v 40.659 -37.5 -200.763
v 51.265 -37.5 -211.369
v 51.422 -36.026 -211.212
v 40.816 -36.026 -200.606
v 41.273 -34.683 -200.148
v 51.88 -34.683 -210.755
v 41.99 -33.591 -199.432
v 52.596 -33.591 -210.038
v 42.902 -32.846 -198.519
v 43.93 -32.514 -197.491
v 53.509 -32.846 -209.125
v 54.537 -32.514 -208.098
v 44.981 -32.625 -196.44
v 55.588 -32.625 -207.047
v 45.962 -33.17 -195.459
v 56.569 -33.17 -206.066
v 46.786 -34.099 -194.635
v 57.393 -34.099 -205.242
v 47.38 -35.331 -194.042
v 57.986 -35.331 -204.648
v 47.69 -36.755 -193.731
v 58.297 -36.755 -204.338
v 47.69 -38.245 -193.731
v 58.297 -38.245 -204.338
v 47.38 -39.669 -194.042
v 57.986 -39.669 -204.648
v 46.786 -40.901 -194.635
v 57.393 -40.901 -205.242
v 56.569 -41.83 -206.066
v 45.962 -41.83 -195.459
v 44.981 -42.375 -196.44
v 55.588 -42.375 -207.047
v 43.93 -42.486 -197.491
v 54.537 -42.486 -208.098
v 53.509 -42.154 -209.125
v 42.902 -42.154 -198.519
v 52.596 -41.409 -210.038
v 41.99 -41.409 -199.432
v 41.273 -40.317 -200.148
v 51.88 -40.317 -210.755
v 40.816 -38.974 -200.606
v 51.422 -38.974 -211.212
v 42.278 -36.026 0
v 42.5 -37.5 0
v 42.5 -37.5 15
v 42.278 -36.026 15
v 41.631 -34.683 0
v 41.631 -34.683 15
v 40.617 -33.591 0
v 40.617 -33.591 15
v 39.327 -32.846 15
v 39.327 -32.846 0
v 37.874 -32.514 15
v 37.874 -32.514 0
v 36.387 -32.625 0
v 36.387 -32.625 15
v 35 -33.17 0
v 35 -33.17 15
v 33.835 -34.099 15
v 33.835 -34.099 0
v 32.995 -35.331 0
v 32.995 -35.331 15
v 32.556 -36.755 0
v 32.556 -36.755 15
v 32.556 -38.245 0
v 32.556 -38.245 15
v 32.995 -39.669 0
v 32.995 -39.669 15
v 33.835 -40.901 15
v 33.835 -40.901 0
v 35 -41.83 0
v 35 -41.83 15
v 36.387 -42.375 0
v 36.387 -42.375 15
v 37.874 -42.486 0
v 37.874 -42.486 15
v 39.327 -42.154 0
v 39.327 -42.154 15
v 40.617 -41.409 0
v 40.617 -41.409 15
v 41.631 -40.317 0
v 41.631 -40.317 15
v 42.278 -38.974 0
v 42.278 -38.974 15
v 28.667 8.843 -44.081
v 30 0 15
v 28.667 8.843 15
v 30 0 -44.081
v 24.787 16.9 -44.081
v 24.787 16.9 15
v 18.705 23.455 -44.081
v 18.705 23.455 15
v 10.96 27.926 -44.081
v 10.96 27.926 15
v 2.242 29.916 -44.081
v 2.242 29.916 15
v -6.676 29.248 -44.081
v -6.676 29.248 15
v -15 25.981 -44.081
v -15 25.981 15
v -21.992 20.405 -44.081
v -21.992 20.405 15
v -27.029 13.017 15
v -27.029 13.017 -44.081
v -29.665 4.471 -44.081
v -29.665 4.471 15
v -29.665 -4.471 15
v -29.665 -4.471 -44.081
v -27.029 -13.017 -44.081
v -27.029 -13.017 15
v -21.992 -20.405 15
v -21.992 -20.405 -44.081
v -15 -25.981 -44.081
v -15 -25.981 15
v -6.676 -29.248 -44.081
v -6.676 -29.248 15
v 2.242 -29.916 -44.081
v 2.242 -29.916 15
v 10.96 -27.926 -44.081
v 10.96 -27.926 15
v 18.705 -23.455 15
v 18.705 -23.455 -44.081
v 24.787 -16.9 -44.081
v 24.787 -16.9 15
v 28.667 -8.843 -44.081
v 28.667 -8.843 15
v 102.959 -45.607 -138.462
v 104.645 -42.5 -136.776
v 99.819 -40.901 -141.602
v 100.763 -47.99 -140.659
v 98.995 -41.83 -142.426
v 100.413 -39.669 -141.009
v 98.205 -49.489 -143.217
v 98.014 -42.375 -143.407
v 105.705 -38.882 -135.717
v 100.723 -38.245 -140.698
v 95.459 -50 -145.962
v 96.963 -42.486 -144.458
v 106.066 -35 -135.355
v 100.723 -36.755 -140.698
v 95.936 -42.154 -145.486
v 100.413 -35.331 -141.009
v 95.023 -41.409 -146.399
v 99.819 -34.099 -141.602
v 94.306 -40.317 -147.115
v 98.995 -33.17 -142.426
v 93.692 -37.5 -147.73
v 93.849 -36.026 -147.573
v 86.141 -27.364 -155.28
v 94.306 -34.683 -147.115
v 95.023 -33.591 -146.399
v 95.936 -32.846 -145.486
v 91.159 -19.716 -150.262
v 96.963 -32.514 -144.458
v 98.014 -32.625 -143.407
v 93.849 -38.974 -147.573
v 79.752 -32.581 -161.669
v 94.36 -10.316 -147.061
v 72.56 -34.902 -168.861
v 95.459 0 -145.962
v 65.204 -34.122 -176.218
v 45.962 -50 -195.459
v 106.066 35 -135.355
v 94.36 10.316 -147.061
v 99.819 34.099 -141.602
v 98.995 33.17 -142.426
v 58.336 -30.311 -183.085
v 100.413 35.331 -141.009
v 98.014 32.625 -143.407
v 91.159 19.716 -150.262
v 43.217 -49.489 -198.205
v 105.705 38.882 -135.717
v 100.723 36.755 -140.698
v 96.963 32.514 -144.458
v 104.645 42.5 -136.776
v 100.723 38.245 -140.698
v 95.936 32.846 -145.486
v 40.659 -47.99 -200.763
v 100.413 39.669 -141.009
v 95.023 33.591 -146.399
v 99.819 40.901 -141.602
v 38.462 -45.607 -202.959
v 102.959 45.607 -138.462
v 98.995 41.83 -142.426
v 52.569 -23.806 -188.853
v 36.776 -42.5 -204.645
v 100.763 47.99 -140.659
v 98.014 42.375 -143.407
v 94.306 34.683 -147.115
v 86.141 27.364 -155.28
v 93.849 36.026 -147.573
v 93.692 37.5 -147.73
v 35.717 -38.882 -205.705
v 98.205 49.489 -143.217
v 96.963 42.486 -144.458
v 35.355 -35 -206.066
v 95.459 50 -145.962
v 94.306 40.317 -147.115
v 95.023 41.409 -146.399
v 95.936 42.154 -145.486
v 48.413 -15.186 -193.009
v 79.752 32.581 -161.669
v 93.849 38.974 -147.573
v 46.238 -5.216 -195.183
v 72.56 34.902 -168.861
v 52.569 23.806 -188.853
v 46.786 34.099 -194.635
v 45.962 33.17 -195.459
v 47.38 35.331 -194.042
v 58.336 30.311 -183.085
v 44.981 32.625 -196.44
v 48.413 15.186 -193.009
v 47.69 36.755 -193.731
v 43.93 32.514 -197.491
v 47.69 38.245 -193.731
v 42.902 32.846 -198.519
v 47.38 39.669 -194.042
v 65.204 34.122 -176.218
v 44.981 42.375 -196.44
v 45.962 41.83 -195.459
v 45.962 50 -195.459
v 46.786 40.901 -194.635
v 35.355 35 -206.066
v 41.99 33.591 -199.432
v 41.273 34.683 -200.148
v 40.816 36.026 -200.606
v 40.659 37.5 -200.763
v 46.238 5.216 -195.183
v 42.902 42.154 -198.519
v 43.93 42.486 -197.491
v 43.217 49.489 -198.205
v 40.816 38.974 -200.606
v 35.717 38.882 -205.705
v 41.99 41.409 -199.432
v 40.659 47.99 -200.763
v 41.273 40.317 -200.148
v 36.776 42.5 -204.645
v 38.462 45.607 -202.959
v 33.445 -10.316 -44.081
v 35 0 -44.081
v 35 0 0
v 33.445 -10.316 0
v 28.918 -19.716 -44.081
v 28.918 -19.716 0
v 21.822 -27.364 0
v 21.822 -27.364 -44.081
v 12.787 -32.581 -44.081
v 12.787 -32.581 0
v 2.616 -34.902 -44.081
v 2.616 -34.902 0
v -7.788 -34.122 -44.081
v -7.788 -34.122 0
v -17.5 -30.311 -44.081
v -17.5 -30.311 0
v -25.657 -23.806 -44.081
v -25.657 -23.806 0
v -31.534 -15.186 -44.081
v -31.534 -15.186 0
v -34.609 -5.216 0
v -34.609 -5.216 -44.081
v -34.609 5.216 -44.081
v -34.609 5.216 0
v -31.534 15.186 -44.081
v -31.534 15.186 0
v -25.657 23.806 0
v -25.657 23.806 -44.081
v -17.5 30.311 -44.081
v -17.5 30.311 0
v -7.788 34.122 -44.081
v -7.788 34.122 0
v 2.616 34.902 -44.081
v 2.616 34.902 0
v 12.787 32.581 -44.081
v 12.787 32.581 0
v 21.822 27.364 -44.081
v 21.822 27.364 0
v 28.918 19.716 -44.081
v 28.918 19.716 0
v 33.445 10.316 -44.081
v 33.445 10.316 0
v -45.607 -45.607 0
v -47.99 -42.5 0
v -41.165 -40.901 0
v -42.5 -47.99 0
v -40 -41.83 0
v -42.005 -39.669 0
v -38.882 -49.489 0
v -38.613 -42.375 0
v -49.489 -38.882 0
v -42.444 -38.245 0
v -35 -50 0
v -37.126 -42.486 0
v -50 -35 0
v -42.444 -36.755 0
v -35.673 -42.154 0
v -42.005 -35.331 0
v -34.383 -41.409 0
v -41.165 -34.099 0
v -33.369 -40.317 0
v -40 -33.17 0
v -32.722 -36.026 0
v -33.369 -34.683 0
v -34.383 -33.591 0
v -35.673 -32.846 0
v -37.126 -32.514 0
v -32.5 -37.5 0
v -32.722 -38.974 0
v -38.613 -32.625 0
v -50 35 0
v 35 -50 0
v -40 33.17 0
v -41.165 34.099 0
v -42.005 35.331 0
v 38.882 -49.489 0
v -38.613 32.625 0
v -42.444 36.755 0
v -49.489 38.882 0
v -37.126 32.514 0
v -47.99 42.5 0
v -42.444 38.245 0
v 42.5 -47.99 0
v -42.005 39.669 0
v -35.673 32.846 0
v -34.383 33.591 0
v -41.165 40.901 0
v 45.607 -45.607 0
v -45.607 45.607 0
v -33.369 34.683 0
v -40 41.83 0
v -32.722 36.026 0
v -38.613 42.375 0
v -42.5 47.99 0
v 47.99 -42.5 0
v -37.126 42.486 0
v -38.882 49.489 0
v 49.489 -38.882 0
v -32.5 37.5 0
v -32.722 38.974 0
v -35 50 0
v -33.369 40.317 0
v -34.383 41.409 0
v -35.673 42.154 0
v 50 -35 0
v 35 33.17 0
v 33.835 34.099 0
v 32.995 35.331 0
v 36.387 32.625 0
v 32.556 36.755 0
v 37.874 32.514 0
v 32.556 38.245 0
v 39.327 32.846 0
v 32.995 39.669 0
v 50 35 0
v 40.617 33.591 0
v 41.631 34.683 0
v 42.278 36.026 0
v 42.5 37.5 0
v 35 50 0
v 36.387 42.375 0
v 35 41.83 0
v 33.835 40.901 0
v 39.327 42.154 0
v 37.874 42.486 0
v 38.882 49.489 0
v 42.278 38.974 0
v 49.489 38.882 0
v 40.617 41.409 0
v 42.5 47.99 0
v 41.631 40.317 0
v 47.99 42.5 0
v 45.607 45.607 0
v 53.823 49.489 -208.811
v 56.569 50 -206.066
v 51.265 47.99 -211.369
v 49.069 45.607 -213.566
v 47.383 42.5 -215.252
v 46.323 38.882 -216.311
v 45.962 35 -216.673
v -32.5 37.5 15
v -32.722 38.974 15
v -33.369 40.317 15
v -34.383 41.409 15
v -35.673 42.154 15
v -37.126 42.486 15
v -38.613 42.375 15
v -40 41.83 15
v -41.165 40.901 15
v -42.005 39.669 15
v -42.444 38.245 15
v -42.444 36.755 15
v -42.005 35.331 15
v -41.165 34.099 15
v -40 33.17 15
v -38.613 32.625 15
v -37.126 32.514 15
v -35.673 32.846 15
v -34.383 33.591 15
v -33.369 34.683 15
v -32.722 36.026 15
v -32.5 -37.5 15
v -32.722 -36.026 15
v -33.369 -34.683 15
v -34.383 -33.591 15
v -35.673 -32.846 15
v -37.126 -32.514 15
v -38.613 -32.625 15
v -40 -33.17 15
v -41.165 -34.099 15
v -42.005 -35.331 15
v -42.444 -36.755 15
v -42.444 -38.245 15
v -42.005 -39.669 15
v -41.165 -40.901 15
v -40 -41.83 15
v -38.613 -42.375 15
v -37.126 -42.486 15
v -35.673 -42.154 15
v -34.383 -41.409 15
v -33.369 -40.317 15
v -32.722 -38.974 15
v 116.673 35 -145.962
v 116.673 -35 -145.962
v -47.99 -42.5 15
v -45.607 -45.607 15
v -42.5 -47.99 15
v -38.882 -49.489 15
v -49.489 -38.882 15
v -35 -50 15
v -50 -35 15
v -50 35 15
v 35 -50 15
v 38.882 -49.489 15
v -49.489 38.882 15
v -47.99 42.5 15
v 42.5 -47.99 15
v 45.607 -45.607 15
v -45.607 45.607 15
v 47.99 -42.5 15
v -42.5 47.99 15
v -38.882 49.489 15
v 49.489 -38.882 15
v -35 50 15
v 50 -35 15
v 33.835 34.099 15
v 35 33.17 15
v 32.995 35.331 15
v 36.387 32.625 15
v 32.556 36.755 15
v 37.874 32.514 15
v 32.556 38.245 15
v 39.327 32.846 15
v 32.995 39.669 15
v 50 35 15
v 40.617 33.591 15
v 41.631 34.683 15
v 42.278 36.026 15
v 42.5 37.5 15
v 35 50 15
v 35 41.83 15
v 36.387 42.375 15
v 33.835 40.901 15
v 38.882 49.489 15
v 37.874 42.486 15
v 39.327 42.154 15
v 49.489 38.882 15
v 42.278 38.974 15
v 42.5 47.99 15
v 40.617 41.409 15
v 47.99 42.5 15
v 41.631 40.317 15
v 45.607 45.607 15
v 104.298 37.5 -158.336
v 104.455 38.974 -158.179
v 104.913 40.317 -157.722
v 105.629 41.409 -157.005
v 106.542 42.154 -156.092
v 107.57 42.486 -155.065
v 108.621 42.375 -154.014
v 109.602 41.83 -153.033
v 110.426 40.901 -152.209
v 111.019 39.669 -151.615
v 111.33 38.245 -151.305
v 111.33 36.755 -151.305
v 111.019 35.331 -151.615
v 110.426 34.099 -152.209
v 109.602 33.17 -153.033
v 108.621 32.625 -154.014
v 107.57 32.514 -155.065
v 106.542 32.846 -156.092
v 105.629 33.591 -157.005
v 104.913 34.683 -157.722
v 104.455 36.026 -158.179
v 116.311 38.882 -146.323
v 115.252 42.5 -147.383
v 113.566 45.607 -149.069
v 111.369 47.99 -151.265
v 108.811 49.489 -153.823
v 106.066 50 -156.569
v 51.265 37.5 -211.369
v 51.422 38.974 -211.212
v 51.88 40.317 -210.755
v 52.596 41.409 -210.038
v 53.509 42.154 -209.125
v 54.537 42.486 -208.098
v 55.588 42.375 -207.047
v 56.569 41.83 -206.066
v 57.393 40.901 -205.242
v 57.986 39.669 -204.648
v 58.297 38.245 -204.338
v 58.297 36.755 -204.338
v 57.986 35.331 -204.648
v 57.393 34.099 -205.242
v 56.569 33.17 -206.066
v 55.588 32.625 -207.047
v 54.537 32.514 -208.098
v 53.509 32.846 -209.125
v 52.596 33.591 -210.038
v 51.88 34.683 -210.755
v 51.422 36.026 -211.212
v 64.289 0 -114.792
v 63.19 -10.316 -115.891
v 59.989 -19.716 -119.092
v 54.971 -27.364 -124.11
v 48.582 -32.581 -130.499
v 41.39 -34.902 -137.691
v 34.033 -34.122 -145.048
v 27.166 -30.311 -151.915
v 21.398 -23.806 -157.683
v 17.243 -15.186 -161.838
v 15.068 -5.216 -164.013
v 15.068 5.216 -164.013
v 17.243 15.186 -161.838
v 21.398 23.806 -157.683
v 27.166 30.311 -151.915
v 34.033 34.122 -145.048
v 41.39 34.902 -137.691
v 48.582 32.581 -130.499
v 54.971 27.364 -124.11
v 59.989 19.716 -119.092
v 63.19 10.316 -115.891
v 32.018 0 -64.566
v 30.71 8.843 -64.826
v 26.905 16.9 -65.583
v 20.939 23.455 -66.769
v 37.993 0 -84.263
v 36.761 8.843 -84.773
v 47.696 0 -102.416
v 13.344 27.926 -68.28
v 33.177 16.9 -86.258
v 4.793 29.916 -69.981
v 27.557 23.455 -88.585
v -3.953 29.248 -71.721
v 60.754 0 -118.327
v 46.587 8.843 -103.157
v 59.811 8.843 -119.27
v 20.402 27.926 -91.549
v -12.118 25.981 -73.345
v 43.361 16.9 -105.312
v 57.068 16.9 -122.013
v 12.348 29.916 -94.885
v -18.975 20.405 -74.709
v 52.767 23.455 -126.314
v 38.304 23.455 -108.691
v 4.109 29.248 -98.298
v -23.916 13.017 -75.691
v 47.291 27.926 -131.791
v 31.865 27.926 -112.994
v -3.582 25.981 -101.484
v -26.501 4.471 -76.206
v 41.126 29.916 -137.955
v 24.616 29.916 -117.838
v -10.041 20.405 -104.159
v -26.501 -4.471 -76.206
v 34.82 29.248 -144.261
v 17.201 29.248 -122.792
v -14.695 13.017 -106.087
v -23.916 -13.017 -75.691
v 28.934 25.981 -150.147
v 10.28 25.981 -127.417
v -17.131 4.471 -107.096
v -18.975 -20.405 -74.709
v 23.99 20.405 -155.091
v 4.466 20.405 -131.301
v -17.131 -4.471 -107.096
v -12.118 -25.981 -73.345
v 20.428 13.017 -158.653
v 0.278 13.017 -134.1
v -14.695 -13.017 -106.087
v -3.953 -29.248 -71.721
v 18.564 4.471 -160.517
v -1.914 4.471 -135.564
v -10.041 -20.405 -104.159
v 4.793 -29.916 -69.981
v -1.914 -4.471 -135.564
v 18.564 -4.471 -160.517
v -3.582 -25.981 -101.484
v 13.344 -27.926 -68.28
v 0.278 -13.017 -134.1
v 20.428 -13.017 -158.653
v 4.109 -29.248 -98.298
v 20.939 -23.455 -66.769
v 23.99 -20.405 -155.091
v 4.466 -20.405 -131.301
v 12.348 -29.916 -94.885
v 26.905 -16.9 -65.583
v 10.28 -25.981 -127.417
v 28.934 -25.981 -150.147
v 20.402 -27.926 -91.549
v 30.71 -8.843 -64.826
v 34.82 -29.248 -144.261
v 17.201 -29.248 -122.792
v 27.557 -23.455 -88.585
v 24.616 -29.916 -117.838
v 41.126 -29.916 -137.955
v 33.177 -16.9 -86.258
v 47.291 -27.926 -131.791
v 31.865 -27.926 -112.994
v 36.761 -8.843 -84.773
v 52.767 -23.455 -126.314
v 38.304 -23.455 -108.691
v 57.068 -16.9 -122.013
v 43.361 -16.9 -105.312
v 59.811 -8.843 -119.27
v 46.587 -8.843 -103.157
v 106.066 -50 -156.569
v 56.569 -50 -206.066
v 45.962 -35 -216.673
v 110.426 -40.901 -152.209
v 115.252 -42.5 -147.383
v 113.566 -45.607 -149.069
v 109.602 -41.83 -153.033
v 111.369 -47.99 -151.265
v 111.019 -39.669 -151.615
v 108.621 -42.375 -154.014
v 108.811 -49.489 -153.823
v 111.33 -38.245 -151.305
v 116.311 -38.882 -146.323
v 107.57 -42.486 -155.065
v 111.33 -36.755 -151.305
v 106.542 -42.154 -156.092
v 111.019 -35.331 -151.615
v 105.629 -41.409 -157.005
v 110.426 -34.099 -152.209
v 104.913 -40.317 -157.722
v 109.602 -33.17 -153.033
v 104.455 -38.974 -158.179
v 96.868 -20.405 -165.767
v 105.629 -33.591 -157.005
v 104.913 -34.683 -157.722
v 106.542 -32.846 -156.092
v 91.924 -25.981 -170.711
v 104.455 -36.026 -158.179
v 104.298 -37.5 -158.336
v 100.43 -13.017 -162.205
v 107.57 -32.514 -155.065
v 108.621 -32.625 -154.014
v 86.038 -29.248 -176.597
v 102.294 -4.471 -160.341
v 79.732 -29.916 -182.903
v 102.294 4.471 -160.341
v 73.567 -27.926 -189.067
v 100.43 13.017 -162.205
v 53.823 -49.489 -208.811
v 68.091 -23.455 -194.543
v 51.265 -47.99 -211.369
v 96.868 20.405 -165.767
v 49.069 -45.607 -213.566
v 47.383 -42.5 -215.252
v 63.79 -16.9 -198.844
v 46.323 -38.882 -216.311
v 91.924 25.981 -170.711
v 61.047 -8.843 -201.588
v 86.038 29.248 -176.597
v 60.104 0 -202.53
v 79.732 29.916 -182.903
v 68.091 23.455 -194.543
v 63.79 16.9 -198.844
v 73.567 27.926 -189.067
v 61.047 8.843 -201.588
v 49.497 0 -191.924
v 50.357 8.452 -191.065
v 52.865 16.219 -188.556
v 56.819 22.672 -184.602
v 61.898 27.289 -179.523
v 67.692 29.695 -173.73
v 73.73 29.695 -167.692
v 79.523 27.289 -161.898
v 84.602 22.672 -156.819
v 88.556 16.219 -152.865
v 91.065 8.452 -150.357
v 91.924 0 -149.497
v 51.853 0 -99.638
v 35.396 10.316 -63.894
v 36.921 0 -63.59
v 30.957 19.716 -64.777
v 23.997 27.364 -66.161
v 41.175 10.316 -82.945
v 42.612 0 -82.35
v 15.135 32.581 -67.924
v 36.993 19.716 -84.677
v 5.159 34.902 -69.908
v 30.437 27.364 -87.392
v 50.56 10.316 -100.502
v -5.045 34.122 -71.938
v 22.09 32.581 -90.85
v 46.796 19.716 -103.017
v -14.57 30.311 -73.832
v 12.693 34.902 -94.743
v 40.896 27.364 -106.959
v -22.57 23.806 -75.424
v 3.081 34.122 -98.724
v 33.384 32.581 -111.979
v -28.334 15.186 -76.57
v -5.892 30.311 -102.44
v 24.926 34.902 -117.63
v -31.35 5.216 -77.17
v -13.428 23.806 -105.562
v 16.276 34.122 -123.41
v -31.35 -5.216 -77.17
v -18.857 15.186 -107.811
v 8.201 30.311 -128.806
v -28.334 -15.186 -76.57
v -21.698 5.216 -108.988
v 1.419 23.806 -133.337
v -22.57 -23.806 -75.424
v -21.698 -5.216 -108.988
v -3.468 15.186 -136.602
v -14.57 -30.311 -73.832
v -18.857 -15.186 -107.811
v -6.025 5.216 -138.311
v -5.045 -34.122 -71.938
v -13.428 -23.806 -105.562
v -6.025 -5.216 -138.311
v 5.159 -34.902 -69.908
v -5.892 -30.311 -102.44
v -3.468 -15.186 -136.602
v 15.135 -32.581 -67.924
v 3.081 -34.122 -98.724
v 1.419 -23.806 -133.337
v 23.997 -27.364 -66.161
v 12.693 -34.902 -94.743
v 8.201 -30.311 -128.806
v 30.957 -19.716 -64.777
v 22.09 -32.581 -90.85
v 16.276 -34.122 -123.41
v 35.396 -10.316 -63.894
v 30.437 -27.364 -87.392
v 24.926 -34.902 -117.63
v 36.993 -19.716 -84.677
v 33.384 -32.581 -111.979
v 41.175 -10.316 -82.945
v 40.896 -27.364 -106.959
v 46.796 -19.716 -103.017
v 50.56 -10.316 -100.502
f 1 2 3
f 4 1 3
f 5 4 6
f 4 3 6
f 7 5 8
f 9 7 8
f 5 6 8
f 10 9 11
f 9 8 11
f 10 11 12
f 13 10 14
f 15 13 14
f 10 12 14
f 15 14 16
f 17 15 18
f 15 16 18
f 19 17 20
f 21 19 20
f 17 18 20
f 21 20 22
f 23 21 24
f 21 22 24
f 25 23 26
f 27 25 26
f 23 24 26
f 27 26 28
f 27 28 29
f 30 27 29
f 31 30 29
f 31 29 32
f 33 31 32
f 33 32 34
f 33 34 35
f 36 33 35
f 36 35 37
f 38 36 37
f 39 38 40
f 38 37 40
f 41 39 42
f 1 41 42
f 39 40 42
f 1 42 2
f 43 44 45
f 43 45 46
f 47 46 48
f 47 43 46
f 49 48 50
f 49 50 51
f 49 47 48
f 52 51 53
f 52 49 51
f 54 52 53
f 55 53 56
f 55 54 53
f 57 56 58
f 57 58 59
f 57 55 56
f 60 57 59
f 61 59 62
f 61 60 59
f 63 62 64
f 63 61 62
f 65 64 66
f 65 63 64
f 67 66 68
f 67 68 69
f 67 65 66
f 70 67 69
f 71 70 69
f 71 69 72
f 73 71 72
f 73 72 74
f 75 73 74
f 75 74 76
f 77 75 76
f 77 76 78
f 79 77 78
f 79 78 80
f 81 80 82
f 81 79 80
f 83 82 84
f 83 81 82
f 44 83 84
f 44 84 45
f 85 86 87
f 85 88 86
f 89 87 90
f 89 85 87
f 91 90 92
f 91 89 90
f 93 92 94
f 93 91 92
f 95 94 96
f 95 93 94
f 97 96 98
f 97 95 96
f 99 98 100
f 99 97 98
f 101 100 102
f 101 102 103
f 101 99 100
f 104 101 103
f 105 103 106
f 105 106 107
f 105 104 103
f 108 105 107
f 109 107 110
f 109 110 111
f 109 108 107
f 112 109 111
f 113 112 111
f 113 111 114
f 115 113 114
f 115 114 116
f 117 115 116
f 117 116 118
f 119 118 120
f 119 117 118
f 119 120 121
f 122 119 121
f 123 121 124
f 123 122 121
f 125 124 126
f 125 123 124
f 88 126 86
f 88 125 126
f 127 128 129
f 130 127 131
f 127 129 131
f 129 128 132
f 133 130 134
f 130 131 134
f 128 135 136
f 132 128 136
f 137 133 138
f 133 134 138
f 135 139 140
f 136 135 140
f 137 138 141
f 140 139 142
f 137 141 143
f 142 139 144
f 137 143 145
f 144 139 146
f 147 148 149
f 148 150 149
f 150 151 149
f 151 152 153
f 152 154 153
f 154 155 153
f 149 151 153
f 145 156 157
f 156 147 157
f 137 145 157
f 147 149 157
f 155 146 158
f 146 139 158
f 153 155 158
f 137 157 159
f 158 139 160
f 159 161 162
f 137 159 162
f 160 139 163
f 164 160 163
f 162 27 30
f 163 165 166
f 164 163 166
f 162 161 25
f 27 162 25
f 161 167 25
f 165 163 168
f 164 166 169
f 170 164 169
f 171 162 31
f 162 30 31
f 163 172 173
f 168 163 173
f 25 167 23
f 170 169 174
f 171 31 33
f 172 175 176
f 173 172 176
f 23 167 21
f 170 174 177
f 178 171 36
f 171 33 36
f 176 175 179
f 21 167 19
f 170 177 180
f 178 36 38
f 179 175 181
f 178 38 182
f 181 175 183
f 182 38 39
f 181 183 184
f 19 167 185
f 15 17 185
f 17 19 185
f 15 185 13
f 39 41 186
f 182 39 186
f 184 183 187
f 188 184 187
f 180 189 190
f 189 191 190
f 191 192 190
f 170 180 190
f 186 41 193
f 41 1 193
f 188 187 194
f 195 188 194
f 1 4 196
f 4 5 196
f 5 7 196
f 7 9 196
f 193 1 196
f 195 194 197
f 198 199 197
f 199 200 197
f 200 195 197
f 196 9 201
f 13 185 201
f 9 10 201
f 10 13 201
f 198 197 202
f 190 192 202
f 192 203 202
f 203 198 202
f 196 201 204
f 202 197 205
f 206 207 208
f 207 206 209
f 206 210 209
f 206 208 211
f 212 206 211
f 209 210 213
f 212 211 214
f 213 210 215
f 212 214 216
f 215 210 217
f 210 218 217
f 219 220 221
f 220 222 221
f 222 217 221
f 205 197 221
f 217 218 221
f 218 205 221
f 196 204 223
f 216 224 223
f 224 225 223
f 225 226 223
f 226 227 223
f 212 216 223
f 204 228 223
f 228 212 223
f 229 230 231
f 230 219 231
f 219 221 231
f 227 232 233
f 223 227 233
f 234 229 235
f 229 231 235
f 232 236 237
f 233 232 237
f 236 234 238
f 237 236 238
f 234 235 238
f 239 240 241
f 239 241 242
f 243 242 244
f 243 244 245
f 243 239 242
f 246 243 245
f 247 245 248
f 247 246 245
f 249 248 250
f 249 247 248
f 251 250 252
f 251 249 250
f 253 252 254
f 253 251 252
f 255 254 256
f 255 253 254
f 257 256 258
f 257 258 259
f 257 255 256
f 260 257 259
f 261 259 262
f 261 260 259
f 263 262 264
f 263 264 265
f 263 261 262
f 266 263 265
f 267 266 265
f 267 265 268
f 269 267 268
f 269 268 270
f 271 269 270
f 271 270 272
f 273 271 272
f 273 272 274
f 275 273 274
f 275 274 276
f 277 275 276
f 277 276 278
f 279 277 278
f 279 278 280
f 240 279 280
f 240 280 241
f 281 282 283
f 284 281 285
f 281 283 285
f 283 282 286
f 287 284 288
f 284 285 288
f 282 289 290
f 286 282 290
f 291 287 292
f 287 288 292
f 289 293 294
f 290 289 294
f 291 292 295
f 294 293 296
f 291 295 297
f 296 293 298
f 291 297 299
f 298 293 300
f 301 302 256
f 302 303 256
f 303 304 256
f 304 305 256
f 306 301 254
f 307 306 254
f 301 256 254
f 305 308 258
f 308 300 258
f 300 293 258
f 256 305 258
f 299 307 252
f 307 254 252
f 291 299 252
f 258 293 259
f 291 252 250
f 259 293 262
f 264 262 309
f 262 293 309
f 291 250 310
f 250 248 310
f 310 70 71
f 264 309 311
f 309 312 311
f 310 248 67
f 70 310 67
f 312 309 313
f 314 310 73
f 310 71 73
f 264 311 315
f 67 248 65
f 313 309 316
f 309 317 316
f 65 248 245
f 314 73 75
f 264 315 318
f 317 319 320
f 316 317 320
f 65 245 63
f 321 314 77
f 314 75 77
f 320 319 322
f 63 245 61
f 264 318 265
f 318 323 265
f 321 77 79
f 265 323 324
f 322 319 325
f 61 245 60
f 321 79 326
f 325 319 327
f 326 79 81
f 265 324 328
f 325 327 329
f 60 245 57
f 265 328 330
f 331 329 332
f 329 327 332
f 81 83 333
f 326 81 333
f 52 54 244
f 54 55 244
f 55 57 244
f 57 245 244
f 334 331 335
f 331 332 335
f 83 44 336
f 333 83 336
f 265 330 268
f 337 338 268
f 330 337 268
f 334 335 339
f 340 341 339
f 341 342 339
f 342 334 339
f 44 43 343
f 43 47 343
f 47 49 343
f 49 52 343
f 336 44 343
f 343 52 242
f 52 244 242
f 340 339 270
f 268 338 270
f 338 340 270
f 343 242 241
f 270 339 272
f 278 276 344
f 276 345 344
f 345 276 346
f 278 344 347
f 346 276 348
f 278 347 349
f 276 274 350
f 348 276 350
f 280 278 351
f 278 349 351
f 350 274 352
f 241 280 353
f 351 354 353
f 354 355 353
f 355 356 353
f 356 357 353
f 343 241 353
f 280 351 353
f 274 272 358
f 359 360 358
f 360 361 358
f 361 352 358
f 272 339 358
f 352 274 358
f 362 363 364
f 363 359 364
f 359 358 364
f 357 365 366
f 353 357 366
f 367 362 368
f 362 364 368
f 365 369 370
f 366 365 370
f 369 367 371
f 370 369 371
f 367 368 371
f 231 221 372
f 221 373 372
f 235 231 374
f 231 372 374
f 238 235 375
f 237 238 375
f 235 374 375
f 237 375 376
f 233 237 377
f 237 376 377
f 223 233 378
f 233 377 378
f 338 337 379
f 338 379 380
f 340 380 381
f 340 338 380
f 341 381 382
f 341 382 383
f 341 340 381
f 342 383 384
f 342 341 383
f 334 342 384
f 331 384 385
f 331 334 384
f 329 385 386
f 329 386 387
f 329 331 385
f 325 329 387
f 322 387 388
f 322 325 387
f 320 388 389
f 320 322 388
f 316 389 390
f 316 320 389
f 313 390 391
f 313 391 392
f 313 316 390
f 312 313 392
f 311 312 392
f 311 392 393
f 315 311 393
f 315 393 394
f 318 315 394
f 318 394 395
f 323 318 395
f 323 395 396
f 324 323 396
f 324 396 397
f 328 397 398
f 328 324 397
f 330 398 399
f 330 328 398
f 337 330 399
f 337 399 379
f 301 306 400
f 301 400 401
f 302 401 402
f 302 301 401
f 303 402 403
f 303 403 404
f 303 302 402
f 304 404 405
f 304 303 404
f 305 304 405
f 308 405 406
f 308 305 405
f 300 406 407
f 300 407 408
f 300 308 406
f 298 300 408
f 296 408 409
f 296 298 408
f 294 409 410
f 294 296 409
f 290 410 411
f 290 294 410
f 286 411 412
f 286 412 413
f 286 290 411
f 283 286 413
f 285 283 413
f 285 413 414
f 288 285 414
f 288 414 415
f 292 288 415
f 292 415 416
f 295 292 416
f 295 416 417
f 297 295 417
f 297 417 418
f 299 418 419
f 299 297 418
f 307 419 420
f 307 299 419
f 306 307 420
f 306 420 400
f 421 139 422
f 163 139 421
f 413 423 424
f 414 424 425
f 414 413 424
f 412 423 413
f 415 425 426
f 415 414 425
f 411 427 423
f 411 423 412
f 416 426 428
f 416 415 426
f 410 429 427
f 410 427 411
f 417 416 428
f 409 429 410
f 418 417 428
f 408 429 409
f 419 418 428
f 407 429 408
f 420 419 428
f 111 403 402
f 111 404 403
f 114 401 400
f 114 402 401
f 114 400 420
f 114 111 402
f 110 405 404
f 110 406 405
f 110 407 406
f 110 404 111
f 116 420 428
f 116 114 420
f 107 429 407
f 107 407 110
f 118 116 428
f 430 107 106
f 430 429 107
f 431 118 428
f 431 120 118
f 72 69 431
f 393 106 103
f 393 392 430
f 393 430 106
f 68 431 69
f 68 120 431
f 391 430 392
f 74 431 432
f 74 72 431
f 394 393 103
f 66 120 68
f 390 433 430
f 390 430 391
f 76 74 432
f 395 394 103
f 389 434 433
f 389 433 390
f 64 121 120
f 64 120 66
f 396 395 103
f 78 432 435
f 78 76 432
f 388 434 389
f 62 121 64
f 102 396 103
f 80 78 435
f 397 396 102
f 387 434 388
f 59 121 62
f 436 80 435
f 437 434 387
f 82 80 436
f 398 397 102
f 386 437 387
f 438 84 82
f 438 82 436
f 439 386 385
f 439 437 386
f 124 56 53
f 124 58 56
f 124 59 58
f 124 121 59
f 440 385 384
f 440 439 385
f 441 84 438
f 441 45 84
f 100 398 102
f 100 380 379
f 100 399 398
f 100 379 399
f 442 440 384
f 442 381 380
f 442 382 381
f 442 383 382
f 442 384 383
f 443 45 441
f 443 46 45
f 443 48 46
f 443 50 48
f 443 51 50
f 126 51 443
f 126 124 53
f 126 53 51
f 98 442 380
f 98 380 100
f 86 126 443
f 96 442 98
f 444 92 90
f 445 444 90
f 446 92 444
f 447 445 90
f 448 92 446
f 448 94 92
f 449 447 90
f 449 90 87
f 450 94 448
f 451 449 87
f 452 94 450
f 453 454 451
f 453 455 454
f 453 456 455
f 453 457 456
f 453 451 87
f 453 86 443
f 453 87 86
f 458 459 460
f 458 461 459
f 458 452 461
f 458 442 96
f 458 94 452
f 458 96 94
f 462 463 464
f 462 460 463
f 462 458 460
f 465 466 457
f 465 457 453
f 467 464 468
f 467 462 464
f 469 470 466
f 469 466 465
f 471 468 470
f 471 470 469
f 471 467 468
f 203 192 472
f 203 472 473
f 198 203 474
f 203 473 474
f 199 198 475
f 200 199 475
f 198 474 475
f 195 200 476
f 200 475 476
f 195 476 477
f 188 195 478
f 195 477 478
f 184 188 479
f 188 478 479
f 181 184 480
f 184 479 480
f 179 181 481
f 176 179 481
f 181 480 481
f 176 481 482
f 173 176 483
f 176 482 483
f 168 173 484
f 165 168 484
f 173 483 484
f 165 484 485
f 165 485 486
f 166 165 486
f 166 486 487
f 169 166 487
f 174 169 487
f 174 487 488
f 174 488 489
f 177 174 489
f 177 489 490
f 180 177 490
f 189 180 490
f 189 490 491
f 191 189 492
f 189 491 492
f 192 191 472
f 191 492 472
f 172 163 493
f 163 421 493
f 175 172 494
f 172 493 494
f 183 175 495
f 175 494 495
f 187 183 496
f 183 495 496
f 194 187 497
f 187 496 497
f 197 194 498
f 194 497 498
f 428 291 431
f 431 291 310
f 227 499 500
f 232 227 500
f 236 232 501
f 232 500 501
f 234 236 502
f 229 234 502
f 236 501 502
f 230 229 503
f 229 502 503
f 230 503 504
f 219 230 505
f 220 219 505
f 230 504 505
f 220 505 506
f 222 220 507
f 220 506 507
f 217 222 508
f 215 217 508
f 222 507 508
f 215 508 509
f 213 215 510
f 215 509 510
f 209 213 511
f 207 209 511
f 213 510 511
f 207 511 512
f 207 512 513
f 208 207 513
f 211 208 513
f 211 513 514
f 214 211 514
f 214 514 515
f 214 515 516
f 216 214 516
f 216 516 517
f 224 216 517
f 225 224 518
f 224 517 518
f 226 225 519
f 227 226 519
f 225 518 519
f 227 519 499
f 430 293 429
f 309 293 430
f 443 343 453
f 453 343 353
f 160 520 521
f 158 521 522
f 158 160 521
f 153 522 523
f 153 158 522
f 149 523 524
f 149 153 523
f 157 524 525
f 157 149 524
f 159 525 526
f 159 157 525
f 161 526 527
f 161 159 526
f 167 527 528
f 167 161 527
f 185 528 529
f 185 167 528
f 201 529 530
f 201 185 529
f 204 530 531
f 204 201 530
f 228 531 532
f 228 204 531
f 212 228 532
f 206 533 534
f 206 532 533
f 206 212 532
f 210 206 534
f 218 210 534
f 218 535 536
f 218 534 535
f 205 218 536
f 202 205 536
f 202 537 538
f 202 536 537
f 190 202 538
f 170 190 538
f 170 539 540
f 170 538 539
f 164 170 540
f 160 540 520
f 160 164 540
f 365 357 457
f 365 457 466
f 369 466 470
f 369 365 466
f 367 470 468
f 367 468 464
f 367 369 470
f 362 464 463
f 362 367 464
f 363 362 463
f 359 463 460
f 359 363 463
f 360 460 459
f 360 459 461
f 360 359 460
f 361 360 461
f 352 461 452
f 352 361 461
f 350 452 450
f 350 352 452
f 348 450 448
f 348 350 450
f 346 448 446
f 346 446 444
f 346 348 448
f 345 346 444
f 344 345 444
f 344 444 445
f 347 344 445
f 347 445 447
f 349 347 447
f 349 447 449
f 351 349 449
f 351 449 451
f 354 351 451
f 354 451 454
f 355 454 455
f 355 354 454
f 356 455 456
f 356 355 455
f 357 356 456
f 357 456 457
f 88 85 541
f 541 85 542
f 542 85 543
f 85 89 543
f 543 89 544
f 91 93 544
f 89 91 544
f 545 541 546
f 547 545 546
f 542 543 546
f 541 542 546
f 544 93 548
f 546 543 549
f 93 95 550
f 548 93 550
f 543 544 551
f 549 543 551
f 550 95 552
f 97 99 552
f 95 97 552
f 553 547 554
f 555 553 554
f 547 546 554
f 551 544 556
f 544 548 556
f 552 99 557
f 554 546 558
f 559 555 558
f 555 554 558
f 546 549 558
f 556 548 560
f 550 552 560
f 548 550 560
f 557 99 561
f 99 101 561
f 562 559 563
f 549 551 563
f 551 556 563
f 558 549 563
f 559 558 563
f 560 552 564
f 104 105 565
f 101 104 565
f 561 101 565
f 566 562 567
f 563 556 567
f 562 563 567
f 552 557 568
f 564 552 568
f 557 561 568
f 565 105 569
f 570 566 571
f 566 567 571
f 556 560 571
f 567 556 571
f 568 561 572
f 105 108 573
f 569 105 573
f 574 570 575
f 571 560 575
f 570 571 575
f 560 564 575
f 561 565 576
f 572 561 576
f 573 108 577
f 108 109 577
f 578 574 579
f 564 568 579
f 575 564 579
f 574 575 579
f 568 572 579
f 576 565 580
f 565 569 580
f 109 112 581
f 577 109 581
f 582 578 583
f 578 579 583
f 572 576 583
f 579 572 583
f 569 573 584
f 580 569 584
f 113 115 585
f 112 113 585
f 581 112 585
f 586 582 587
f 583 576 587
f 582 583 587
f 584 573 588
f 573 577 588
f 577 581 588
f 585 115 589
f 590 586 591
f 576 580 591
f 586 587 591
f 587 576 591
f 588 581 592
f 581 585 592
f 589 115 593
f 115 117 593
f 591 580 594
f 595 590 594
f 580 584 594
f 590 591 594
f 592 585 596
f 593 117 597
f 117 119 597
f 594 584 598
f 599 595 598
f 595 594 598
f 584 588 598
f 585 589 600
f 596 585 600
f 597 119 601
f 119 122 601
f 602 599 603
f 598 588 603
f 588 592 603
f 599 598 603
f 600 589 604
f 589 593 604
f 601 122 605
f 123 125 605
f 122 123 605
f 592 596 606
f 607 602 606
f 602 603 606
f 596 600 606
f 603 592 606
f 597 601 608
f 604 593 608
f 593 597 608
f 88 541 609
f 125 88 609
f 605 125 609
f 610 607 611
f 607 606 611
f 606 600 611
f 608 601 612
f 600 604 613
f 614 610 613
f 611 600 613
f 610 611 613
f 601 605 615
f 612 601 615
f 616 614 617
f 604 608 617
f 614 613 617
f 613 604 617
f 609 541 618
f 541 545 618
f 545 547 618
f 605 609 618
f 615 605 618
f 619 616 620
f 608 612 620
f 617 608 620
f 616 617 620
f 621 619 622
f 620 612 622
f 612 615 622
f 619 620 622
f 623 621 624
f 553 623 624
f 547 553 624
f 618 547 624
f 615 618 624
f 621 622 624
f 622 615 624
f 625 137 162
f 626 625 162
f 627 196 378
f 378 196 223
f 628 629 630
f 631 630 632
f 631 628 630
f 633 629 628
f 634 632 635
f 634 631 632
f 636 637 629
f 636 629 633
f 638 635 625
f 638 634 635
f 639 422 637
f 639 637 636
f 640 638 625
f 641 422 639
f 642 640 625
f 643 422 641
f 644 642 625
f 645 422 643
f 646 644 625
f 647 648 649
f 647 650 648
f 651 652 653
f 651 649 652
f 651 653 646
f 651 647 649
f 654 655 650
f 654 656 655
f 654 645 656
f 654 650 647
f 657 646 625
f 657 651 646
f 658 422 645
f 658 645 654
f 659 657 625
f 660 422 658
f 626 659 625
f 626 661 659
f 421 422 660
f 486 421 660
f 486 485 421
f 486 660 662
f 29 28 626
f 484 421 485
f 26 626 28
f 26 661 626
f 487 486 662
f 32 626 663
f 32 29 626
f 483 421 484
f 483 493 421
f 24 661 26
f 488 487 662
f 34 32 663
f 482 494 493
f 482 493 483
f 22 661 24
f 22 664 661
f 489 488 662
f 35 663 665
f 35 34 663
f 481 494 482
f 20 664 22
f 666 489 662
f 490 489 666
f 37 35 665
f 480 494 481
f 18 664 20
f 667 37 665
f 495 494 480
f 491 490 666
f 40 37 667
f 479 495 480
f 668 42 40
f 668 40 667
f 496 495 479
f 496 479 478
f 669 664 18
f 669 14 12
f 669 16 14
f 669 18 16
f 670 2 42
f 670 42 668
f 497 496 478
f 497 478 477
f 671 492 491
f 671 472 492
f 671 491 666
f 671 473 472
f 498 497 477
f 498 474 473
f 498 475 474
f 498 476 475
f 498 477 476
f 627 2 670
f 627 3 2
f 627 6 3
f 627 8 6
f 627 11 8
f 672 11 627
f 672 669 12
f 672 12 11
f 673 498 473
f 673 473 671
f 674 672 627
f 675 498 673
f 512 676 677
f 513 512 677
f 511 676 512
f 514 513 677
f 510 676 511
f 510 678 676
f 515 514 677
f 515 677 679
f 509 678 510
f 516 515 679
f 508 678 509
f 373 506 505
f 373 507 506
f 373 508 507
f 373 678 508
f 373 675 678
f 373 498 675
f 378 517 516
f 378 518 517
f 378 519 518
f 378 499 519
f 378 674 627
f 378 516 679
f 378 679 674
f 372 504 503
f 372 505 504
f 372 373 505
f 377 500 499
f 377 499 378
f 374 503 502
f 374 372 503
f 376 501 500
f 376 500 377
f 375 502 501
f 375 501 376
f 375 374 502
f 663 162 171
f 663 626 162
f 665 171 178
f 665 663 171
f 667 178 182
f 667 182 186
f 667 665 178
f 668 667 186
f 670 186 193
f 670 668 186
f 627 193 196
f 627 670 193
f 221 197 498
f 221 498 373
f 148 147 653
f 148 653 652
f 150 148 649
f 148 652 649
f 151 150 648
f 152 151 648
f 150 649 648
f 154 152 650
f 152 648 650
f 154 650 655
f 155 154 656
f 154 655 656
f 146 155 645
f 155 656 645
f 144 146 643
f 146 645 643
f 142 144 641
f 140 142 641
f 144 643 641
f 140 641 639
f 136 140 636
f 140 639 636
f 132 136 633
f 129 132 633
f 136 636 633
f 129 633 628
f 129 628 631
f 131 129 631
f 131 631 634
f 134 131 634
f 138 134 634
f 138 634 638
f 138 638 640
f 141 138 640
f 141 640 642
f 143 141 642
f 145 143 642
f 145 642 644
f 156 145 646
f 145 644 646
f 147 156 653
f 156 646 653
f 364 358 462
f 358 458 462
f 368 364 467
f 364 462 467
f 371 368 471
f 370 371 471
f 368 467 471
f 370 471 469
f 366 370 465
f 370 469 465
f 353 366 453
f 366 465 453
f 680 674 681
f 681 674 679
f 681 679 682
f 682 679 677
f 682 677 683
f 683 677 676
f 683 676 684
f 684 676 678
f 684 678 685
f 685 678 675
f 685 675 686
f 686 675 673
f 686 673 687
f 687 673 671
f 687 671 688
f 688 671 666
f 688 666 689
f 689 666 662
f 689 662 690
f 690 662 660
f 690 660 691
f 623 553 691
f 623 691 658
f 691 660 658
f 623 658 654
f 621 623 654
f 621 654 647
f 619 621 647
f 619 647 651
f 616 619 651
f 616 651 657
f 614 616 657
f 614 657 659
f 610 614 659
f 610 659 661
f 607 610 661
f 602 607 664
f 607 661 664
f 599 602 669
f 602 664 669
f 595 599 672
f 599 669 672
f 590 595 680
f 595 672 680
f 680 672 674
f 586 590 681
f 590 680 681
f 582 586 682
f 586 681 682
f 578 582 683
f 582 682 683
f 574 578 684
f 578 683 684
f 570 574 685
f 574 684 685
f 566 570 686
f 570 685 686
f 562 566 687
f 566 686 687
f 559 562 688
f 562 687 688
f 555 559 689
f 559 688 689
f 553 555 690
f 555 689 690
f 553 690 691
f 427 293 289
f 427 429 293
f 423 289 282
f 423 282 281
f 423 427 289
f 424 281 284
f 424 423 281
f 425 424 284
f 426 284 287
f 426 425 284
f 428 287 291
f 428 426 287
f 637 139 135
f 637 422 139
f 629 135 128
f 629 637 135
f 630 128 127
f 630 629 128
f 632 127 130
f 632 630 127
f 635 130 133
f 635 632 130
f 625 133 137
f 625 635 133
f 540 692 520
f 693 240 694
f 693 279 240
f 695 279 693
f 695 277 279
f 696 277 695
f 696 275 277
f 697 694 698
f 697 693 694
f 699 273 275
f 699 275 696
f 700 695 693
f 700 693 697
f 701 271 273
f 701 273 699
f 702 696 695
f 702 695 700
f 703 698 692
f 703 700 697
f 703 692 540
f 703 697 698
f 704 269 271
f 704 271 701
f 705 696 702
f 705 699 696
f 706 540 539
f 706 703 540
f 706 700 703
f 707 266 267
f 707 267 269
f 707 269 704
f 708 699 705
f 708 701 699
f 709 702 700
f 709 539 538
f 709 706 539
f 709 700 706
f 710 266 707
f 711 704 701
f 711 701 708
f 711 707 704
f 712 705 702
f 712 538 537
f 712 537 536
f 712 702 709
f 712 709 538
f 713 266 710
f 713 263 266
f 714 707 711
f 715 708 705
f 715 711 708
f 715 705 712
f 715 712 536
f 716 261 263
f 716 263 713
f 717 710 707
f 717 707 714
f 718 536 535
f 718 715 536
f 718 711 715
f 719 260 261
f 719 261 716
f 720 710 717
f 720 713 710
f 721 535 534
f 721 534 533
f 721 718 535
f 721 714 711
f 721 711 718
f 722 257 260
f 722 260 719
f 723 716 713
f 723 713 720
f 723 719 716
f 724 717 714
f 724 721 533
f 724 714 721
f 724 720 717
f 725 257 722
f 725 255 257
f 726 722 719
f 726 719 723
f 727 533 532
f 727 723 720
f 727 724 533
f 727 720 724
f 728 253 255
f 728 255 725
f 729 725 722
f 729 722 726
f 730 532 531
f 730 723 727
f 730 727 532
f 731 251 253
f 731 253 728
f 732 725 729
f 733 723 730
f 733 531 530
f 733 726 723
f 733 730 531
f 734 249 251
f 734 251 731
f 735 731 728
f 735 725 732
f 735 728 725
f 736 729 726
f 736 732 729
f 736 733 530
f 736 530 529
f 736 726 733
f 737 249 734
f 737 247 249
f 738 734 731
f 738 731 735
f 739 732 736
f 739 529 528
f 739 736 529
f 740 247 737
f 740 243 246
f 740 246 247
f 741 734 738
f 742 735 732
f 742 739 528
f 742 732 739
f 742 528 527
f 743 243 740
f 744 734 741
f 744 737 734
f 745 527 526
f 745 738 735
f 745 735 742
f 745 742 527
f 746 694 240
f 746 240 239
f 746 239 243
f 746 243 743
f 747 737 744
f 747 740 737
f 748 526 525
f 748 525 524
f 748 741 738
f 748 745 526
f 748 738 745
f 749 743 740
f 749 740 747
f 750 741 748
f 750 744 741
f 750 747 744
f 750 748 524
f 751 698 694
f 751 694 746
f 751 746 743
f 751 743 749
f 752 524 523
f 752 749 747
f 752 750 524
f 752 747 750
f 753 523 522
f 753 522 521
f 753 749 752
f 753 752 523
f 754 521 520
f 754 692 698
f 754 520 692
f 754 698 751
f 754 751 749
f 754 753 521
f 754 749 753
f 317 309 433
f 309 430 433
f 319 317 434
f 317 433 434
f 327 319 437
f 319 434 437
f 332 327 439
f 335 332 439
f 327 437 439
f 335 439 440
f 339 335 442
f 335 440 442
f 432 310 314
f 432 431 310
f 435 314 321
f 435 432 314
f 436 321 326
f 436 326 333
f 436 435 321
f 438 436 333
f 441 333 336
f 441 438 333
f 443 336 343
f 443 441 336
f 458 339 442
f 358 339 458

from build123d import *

# Parameters (mm, degrees)
CROQUIS1_W              = 100
CROQUIS1_H              = 100
SALIENTE_EXTRUIR1_DEPTH = 15
CROQUIS2_R              = 30
CROQUIS2_R_2            = 5
CORTAR_EXTRUIR1_DEPTH   = 15
CROQUIS9_R              = 35
CROQUIS9_R_2            = 30
CROQUIS12_W             = 100
CROQUIS12_H             = 100
SALIENTE_EXTRUIR2_DEPTH = 15
CORTAR_EXTRUIR2_START   = 15
CROQUIS13_R             = 30
CROQUIS13_R_2           = 5
CORTAR_EXTRUIR2_DEPTH   = 15
REDONDEO1_R             = 15


with BuildPart() as part:
    # Croquis1 → Saliente-Extruir1 (new body)
    with BuildSketch(Plane.XY):
        Rectangle(CROQUIS1_W, CROQUIS1_H)
    extrude(amount=SALIENTE_EXTRUIR1_DEPTH)

    # Croquis2 → Cortar-Extruir1 (cut)
    with BuildSketch(Plane.XY):
        Circle(CROQUIS2_R)
        with Locations((-37.5, 37.5)):
            Circle(CROQUIS2_R_2)
        with Locations((37.5, 37.5)):
            Circle(CROQUIS2_R_2)
        with Locations((37.5, -37.5)):
            Circle(CROQUIS2_R_2)
        with Locations((-37.5, -37.5)):
            Circle(CROQUIS2_R_2)
    extrude(amount=CORTAR_EXTRUIR1_DEPTH, mode=Mode.SUBTRACT)

    # Barrer1: sweep along a path in Croquis3
    with BuildLine(Plane(origin=(0, 0, 0), x_dir=(1, 0, 0), z_dir=(0, 1, 0))) as barrer1_path:
        Line((0, 0), (0, 44.08116908))
        ThreePointArc((0, 44.08116908), (10.276263111, 95.743432449), (39.54058454, 139.54058454))
        Line((39.54058454, 139.54058454), (70.710678119, 170.710678119))
    # Croquis9 → Barrer1 (sweep)
    with BuildSketch(Plane.XY):
        Circle(CROQUIS9_R)
        Circle(CROQUIS9_R_2, mode=Mode.SUBTRACT)
    sweep(path=barrer1_path.line)

    # Croquis12 → Saliente-Extruir2 (add)
    with BuildSketch(Plane(origin=(120.710678119, 0, -120.710678119), x_dir=(-0.7071067811865462, 0, -0.7071067811865489), z_dir=(0.7071067811865489, 0, -0.7071067811865462))):
        with Locations((70.710678119, 0)):
            Rectangle(CROQUIS12_W, CROQUIS12_H)
    extrude(amount=SALIENTE_EXTRUIR2_DEPTH)

    # Croquis13 → Cortar-Extruir2 (cut)
    with BuildSketch(Plane(origin=(120.710678119, 0, -120.710678119), x_dir=(-0.7071067811865462, 0, -0.7071067811865489), z_dir=(0.7071067811865489, 0, -0.7071067811865462)).offset(CORTAR_EXTRUIR2_START)):
        with Locations((70.710678119, 0)):
            Circle(CROQUIS13_R)
        with Locations((108.210678119, 37.5)):
            Circle(CROQUIS13_R_2)
        with Locations((108.210678119, -37.5)):
            Circle(CROQUIS13_R_2)
        with Locations((33.210678119, -37.5)):
            Circle(CROQUIS13_R_2)
        with Locations((33.210678119, 37.5)):
            Circle(CROQUIS13_R_2)
    extrude(amount=-CORTAR_EXTRUIR2_DEPTH, mode=Mode.SUBTRACT)

    # Redondeo1
    redondeo1_edges = [part.edges().sort_by_distance(p)[0] for p in [
        (40.658639918, -50, -211.369318037),
        (40.658639918, 50, -211.369318037),
        (111.369318037, 50, -140.658639918),
        (111.369318037, -50, -140.658639918),
        (50, -50, 7.5),
        (-50, -50, 7.5),
        (-50, 50, 7.5),
        (50, 50, 7.5),
    ]]
    fillet(redondeo1_edges, radius=REDONDEO1_R)


solid = part.part
